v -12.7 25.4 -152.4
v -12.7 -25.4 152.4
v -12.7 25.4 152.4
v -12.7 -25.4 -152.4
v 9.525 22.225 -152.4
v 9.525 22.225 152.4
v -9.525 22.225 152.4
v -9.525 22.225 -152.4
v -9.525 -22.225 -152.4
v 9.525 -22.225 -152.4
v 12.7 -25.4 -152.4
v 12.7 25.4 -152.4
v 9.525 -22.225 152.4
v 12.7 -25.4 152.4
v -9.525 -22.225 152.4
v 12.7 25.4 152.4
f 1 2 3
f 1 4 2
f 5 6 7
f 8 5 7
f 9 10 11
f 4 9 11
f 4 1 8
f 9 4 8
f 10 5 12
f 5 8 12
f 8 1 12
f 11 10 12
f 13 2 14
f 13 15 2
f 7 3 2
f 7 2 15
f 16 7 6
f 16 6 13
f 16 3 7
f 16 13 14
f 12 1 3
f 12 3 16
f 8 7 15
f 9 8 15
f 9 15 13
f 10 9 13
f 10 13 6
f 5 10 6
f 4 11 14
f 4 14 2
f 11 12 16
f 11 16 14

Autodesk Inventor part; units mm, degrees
ref_plane "YZ Plane" through (0, 0, 0) normal (1, 0, 0) x (0, 1, 0)
ref_plane "XZ Plane" through (0, 0, 0) normal (0, 1, 0) x (-1, 0, 0)
ref_plane "XY Plane" through (0, 0, 0) normal (0, 0, 1) x (1, 0, 0)
sketch "Sketch1" plane through (0, 0, 0) normal (0, 0, 1) x (1, 0, 0)
  line L0 (-12.7, 25.4) -> (12.7, 25.4)
  line L1 (12.7, 25.4) -> (12.7, -25.4)
  line L2 (12.7, -25.4) -> (-12.7, -25.4)
  line L3 (-12.7, -25.4) -> (-12.7, 25.4)
  line L4 (9.525, 22.225) -> (-9.525, 22.225)
  line L5 (-9.525, 22.225) -> (-9.525, -22.225)
  line L6 (-9.525, -22.225) -> (9.525, -22.225)
  line L7 (9.525, -22.225) -> (9.525, 22.225)
  point P0 (0, 0)
  point P1 (0, 25.4)
  point P2 (-12.7, 0)
extrude "Extrusion1" add sketch "Sketch1" along normal mid plane 304.8
properties part number "Aluminum Box Tube" material "Aluminum 6061"
